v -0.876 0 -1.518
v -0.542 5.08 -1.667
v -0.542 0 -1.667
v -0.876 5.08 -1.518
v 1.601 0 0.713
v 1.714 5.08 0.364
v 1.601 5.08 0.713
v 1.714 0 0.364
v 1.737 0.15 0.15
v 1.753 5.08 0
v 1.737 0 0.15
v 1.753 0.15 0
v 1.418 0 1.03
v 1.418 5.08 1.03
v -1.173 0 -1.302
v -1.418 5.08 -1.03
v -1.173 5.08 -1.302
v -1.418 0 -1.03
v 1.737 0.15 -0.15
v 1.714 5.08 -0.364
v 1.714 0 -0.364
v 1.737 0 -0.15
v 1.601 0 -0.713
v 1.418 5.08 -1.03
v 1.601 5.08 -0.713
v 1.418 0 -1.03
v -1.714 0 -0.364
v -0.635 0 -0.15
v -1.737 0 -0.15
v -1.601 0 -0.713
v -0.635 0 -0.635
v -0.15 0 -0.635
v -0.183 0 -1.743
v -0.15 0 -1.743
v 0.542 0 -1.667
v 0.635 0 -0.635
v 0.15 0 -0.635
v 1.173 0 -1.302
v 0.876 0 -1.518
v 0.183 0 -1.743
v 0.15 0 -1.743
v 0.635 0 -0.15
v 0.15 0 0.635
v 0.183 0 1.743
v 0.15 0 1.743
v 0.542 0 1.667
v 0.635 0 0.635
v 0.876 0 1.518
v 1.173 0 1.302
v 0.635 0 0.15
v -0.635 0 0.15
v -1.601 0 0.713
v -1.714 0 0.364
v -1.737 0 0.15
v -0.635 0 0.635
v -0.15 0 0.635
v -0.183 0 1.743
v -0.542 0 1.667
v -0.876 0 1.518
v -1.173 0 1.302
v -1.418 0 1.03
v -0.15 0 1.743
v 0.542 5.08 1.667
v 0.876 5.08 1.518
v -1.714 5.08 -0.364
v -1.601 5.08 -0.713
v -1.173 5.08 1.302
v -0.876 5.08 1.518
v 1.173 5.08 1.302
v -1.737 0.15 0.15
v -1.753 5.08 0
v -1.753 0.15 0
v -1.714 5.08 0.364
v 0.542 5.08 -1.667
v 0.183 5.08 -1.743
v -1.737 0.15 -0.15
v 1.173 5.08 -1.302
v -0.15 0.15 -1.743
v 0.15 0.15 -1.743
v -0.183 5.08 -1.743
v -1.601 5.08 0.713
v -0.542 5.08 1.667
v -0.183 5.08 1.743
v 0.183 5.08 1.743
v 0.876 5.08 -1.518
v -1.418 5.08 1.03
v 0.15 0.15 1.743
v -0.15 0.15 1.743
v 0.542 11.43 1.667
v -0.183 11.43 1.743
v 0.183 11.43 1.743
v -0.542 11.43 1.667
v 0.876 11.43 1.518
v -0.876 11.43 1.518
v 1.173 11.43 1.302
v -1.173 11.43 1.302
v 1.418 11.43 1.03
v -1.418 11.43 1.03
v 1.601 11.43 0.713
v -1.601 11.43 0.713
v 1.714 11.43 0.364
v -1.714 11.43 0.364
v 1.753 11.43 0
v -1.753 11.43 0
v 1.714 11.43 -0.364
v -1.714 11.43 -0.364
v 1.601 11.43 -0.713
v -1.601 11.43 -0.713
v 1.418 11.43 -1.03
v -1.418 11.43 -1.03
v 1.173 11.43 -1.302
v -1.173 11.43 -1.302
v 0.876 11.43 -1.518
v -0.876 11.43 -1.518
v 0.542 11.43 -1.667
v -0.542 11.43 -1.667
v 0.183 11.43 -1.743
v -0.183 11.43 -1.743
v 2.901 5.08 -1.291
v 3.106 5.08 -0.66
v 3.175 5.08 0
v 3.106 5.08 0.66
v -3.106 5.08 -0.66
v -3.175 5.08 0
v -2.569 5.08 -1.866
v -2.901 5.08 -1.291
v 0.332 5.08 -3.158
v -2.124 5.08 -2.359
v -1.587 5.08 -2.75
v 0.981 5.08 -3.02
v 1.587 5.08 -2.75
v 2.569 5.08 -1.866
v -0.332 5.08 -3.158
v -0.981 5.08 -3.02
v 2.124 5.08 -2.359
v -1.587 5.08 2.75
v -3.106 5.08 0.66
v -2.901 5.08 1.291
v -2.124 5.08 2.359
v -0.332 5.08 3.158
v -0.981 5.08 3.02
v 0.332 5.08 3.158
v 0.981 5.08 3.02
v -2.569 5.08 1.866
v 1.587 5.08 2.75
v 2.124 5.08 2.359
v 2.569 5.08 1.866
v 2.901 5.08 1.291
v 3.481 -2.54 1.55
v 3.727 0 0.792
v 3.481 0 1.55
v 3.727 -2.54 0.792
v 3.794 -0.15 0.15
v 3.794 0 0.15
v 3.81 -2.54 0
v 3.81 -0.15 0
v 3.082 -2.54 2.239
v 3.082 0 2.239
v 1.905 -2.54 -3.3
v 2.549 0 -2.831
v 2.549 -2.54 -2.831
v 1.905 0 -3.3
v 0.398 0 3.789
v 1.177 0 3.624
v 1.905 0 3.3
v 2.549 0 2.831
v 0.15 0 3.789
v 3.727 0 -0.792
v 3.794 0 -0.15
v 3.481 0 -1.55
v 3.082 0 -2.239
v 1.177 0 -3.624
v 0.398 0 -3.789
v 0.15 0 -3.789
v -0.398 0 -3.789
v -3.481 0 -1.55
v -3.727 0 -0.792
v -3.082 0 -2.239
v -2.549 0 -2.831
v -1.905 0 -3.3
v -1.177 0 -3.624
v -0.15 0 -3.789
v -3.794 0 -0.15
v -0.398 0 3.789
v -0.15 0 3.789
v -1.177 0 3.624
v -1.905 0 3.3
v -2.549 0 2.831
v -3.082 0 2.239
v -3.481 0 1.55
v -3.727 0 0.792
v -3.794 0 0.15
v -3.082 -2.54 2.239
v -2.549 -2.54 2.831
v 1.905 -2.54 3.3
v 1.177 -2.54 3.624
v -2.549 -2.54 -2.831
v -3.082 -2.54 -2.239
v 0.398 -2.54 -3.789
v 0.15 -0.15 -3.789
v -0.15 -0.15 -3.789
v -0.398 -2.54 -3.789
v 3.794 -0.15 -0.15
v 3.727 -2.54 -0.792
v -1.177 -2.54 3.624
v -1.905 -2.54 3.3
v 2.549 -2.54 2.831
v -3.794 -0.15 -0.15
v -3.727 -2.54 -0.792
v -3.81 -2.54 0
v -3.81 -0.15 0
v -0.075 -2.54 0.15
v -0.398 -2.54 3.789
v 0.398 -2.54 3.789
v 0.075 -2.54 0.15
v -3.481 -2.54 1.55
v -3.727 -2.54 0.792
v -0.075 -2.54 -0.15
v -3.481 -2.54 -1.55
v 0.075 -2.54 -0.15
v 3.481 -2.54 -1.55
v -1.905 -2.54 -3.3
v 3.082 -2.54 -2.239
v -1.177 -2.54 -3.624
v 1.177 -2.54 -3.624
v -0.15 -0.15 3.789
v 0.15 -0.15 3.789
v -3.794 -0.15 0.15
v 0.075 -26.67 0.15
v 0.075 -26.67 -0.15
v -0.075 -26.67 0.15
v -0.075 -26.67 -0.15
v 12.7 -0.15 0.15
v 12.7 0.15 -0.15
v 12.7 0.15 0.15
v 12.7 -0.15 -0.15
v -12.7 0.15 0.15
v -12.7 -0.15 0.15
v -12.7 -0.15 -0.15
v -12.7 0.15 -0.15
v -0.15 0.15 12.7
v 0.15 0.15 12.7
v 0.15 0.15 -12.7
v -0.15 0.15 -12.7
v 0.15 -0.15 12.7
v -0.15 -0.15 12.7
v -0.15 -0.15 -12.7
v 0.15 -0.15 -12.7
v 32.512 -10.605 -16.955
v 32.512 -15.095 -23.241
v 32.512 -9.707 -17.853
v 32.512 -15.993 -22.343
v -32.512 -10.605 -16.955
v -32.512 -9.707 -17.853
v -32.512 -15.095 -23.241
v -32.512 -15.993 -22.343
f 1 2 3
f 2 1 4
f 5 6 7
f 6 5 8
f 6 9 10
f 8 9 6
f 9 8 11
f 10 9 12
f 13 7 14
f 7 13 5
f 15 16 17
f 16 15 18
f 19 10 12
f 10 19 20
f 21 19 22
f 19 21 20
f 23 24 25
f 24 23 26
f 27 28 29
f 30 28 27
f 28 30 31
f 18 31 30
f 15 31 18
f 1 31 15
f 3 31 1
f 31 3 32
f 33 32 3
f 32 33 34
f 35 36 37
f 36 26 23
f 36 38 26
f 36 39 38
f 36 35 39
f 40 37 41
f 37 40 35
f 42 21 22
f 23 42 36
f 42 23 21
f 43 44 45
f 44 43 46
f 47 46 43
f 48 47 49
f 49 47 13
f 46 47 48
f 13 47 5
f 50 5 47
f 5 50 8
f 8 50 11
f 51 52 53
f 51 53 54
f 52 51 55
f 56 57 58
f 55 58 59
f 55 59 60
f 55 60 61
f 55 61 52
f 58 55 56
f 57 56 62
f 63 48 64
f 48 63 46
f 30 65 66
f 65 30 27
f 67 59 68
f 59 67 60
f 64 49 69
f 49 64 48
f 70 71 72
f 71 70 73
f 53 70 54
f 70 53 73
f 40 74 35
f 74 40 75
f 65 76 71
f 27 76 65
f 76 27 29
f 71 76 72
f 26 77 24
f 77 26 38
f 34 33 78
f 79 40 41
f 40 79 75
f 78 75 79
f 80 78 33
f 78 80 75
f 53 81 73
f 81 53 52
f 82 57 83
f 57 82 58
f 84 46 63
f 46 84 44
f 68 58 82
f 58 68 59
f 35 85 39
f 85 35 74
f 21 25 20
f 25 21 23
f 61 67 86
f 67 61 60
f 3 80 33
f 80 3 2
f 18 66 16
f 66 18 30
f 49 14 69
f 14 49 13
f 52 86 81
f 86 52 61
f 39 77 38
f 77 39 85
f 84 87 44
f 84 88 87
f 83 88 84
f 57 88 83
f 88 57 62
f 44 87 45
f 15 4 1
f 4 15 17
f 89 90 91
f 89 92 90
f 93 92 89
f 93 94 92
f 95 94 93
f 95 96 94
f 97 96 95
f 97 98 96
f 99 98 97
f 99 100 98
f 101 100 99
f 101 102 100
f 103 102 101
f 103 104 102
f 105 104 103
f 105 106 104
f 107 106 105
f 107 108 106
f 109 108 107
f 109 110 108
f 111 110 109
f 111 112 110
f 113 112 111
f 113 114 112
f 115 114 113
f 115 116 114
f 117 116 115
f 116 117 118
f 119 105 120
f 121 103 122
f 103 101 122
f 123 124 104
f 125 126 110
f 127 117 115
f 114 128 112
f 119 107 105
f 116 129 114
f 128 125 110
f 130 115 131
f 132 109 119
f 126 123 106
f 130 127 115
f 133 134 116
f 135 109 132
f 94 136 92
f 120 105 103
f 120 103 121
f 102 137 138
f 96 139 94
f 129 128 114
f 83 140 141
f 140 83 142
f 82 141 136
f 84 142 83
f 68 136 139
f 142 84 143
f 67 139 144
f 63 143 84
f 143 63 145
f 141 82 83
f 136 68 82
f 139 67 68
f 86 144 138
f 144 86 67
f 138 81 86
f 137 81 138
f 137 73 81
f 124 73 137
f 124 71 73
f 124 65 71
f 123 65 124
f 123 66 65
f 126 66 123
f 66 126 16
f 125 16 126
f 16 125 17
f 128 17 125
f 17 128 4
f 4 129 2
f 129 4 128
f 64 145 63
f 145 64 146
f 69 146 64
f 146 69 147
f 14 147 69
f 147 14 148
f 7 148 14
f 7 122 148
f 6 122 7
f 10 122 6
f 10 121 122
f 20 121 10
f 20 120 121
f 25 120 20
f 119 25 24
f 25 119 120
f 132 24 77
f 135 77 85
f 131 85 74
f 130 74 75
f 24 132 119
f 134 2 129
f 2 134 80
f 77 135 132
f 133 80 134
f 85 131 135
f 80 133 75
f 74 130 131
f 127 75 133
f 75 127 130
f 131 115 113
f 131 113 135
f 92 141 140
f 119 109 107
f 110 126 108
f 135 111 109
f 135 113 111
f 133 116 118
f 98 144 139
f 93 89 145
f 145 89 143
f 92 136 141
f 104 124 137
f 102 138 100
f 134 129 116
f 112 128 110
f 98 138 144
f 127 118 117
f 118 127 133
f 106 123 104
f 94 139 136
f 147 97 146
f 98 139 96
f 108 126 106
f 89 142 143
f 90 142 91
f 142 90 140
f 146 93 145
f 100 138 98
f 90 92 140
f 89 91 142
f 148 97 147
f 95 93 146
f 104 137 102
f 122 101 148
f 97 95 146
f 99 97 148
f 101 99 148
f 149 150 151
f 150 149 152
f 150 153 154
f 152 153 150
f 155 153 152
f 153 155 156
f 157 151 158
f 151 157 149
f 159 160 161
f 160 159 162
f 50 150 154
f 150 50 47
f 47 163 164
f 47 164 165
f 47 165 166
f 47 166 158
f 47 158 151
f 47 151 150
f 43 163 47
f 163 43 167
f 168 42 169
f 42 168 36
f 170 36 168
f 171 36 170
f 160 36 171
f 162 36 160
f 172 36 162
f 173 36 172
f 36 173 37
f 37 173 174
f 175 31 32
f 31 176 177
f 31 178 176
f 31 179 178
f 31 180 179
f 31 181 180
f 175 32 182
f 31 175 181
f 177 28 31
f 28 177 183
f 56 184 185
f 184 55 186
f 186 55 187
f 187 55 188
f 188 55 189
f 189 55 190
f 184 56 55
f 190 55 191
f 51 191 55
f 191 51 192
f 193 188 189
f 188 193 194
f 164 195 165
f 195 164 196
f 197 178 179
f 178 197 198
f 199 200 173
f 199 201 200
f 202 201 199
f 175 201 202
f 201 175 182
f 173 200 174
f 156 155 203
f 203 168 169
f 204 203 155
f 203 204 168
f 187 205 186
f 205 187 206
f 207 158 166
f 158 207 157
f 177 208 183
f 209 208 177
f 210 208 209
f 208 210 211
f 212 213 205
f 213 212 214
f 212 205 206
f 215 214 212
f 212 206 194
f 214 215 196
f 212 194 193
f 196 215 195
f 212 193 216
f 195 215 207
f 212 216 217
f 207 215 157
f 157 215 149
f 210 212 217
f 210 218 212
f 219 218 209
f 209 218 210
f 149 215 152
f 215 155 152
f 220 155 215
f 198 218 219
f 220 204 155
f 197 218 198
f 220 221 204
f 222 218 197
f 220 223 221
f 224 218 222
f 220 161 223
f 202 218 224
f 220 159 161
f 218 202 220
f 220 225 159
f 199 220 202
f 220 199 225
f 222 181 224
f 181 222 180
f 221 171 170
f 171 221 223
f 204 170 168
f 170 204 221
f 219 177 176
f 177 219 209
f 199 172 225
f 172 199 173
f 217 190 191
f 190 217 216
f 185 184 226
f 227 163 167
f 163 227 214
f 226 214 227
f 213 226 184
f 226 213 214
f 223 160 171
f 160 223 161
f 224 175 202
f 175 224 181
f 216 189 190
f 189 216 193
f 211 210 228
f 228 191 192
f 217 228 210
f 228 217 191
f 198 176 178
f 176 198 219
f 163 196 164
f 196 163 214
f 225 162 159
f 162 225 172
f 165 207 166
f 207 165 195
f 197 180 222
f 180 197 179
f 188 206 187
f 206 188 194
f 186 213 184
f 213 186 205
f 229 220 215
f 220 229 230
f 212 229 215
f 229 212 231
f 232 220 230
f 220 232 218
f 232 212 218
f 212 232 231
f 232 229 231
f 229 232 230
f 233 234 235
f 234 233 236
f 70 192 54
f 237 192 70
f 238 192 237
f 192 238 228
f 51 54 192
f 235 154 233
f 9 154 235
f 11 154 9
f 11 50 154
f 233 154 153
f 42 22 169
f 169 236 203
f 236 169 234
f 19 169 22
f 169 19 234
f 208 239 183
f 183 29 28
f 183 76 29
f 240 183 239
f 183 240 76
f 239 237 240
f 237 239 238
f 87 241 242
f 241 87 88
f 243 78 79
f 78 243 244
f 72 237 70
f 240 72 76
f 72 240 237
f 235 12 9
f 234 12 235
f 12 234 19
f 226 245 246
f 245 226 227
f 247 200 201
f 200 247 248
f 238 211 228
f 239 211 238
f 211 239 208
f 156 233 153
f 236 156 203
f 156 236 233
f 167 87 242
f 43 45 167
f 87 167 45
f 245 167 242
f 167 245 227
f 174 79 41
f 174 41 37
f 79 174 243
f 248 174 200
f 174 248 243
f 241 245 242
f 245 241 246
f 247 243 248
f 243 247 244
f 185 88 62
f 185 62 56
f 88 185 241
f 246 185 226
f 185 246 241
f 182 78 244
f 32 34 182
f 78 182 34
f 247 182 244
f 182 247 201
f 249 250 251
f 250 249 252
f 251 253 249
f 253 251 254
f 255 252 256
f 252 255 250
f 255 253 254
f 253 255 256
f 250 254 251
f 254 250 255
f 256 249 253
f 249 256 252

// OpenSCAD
include <../mo/mo.scad>

moSnapFastener6BodyDiameter = 0.1380 * in;
moSnapFastener6HeadDiameter = 0.3 * in;
moSnapFastener6HeadHeight = 0.1 * in;
moSnapFastener6AnchorDiameter = 0.25 * in;
moSnapFastener6AnchorHeight = 0.25 * in;

positions = [
  [ [ 0, 0, 0 ], [ 0, 0, 1 ], 0 ]
];

module moSnapFastener6( l = 0.25 * in, p = 0, info = false ) {
  moPresent( positions, p, info )
    color( Nylon ) {
      moPitch(){
        translate( [0,0,-(moSnapFastener6AnchorHeight+l)/2] )
          union() {
            cylinder( h = moSnapFastener6AnchorHeight+l, d = moSnapFastener6BodyDiameter, center = true );
            translate( [ 0,0,-l/2 ] )
            cylinder( h = moSnapFastener6AnchorHeight, r2 = moSnapFastener6AnchorDiameter/2, r1 = moSnapFastener6BodyDiameter/2, center = true );
          }
          translate( [0,0,moSnapFastener6HeadHeight/2] )
            cylinder( h = moSnapFastener6HeadHeight, d = moSnapFastener6HeadDiameter, center = true );
       }
    }
}

module moSnapFastener6Move( from, to ) {
  coreMove( positions, from, to )
    children();
}

function moSnapFastener6Position( p = 0 ) = positions[ p ];

moMoveOriginTo( moSnapFastener6Position( 0 ) )
  moSnapFastener6( 0.2 * in, info = true, $name = true );
